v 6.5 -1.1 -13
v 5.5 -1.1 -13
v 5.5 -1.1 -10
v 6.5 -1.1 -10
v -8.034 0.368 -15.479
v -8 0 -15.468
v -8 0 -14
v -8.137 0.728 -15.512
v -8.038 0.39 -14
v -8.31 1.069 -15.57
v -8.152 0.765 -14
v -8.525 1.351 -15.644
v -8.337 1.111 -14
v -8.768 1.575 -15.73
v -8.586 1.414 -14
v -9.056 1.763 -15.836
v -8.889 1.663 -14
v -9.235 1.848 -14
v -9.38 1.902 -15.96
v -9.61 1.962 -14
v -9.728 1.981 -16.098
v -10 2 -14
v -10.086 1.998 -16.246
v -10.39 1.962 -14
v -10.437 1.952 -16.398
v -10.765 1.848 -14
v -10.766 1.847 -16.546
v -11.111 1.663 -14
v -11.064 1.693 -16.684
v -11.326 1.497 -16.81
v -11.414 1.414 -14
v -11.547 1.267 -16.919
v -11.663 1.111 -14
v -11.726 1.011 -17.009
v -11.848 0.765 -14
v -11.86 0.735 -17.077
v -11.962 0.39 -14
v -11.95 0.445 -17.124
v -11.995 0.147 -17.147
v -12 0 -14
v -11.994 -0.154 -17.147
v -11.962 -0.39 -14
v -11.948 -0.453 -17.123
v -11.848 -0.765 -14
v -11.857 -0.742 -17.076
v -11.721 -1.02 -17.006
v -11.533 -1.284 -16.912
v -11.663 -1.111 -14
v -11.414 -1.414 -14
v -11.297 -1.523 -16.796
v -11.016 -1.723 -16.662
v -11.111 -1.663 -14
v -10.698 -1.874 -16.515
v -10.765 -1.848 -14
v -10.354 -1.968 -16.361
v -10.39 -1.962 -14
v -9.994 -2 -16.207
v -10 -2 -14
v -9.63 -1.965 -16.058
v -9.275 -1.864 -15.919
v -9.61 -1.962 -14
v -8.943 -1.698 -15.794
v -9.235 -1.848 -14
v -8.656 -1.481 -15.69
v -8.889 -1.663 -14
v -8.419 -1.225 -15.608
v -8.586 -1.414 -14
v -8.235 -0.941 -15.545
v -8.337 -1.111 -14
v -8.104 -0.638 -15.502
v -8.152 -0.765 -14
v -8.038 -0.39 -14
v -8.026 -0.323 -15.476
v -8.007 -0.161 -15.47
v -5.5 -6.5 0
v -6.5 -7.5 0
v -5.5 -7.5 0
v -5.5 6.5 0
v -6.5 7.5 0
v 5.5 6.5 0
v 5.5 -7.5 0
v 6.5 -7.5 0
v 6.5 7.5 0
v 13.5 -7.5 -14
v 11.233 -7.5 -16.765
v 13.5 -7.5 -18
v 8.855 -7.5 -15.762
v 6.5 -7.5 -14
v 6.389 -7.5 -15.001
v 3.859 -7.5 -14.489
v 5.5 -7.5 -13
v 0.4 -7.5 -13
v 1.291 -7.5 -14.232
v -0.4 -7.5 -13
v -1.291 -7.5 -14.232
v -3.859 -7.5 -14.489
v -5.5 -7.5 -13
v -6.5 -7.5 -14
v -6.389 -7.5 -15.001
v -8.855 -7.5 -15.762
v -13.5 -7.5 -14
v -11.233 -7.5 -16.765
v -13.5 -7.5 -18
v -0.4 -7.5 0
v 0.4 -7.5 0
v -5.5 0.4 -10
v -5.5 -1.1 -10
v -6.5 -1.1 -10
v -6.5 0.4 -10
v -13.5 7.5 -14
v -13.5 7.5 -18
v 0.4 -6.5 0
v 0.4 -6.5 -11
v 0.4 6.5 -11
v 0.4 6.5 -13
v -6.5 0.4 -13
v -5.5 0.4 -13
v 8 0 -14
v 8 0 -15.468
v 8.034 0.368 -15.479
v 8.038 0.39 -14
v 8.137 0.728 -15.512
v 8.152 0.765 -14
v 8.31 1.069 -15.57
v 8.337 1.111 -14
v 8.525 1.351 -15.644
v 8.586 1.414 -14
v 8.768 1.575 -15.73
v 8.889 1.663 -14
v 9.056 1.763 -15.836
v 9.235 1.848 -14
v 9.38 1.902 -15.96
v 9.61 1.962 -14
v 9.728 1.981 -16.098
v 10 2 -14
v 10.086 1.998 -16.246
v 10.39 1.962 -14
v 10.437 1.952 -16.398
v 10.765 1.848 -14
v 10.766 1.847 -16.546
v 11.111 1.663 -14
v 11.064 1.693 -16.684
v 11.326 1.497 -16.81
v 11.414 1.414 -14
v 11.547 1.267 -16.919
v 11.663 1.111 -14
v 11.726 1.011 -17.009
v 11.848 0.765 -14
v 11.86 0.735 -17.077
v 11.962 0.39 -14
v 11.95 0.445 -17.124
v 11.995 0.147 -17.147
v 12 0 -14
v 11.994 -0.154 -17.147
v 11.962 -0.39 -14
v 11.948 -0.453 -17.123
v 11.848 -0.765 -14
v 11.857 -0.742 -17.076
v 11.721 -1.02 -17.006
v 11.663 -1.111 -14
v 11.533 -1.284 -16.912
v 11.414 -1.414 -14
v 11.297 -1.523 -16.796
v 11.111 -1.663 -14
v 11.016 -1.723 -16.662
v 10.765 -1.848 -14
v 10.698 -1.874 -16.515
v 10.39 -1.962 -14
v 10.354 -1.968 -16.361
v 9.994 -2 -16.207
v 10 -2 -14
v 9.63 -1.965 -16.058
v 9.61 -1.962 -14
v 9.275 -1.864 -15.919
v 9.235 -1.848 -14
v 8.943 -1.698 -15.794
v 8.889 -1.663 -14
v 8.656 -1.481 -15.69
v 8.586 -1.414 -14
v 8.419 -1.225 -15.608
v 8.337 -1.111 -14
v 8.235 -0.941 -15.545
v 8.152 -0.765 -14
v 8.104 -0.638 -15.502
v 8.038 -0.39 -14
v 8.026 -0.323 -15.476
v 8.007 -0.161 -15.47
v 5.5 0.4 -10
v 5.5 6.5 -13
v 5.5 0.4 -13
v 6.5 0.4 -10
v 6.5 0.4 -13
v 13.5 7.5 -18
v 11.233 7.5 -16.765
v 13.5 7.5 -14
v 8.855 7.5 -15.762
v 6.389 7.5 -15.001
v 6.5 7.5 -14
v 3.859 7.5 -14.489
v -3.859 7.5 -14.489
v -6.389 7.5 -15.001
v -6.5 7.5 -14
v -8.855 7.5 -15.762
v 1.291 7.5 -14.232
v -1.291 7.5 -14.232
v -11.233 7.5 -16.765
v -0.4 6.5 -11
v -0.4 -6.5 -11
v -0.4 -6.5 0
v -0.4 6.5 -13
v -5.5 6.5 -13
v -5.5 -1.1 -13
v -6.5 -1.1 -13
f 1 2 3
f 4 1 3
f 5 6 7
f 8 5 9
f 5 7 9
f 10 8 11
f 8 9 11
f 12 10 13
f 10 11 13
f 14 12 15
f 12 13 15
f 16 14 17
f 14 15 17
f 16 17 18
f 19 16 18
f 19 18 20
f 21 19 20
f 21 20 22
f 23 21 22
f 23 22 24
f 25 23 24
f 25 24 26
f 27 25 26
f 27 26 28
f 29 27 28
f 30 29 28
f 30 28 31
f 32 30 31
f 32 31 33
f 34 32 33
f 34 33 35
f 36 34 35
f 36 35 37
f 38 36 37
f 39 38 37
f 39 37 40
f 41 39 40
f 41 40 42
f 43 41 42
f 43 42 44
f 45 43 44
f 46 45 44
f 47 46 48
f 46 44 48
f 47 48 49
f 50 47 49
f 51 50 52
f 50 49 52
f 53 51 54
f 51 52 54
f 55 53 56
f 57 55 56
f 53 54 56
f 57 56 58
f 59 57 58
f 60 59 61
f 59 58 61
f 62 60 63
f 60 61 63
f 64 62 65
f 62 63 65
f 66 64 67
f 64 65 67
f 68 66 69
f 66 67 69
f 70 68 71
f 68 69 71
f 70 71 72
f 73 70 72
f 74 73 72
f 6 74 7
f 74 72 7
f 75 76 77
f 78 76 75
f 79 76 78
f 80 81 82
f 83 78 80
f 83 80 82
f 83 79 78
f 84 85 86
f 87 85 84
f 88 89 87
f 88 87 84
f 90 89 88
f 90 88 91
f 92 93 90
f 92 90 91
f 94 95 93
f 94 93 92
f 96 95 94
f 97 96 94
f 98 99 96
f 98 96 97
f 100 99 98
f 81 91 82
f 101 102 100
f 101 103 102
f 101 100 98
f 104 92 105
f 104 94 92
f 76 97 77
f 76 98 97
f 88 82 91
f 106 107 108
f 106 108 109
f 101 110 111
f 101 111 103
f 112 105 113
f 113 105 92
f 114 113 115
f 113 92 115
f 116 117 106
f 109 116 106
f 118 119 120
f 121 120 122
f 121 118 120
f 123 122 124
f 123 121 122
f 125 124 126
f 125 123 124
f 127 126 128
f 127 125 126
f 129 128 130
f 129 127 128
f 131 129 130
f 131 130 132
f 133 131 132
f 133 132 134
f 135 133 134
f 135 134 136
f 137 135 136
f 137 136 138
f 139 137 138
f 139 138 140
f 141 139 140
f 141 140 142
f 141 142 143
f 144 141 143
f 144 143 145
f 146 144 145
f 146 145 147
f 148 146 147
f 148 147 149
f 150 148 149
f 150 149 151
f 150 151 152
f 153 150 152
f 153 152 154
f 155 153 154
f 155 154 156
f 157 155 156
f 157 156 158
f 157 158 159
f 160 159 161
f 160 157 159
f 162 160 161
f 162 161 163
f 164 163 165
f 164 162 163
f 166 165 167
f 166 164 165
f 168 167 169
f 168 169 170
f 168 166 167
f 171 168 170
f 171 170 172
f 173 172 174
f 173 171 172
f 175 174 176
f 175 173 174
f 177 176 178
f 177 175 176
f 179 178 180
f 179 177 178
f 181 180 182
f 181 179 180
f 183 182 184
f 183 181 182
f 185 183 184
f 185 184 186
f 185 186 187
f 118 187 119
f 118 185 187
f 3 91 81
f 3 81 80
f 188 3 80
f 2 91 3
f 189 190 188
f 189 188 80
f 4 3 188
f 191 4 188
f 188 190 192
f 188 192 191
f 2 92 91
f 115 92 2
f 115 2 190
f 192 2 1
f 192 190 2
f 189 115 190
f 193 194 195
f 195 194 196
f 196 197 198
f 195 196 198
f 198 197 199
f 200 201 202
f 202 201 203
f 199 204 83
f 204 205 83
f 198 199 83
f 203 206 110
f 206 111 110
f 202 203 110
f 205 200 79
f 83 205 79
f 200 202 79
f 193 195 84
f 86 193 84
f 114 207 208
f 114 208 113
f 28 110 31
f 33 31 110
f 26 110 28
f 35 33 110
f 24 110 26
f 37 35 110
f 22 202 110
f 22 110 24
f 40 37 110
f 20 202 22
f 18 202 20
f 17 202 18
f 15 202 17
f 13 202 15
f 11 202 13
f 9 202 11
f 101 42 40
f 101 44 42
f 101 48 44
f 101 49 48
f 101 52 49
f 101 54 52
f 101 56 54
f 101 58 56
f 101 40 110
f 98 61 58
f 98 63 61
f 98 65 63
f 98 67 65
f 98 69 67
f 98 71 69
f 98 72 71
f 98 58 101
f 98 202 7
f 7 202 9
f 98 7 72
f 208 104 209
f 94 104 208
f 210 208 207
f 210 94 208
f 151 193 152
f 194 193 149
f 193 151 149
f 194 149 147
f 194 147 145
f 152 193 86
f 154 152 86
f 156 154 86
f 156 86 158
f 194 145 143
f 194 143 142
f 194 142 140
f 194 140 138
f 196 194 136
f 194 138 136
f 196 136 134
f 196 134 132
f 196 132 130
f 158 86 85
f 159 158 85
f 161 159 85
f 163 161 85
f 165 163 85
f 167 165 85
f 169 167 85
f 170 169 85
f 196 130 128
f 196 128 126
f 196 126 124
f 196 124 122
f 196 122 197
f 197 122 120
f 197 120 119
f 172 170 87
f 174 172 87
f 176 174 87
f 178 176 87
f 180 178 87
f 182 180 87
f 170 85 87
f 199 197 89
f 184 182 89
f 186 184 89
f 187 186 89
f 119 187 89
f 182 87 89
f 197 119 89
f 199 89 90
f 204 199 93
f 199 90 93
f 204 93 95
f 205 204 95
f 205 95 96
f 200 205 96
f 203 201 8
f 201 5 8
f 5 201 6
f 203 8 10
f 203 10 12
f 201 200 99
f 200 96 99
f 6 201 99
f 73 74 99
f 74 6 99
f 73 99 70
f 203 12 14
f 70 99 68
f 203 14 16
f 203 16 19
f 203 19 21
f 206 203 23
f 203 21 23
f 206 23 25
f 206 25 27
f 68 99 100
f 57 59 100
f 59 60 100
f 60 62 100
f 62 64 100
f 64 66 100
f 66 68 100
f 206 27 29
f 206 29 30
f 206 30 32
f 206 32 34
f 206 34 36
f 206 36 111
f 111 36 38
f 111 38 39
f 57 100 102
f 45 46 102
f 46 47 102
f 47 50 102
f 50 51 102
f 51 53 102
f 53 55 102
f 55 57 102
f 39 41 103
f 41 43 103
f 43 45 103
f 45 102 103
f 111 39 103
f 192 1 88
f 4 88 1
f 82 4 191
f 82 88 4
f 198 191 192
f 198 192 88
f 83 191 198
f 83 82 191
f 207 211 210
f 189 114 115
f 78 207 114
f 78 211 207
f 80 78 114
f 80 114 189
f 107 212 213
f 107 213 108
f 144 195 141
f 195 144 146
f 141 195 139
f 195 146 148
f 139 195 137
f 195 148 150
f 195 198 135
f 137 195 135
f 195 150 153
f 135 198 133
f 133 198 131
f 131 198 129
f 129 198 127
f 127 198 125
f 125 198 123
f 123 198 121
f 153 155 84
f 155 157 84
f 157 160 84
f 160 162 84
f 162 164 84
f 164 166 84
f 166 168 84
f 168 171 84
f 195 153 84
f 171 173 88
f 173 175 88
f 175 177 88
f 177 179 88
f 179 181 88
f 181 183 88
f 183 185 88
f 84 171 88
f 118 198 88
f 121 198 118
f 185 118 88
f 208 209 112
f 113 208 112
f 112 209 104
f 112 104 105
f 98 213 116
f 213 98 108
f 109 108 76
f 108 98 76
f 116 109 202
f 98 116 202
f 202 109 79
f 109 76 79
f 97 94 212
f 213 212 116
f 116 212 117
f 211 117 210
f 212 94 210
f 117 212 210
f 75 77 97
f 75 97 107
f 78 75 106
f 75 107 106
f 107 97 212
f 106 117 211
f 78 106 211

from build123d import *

# Parameters (mm, degrees)
F1_W      = 13
F1_H      = 15
F2_DEPTH  = 18
F0_W      = 11
F0_H      = 13
F3_DEPTH  = 13
F4_W      = 0.8
F4_H      = 13
F5_DEPTH  = 2
F7_W      = 5.064733
F7_H      = 2.673392
F6_W      = 5.1
F6_H      = 2.730513
F8_DEPTH  = 15
F9_W      = 1.5
F9_H      = 3
F10_DEPTH = 25
F13_W     = 15
F13_H     = 4
F14_DEPTH = 7
F15_R     = 2
F16_DEPTH = 25
F19_DEPTH = 25


with BuildPart() as f2:
    # F1 (on Top) → F2 (new body)
    with BuildSketch(Plane.XY):
        Rectangle(F1_W, F1_H)
    extrude(amount=-F2_DEPTH)

    # F0 (on Top) → F3 (cut)
    with BuildSketch(Plane.XY):
        Rectangle(F0_W, F0_H)
    extrude(amount=-F3_DEPTH, mode=Mode.SUBTRACT)

    # F4 (on face) → F5 (join)
    with BuildSketch(Plane.XY.offset(-13)):
        Rectangle(F4_W, F4_H)
    extrude(amount=F5_DEPTH)

    # F7 (on face) + F6 (on face) → F8 (cut)
    with BuildSketch(Plane.XY.offset(-13)):
        with Locations((-2.967633, -6.836696)):
            Rectangle(F7_W, F7_H)
    with BuildSketch(Plane.XY.offset(-13)):
        with Locations((2.95, -6.865257)):
            Rectangle(F6_W, F6_H)
    extrude(amount=F8_DEPTH, mode=Mode.SUBTRACT)

    # F9 (on face) → F10 (cut)
    with BuildSketch(Plane.YZ.offset(-5.5)):
        with Locations((-0.35, -11.5)):
            Rectangle(F9_W, F9_H)
    extrude(amount=-F10_DEPTH, mode=Mode.SUBTRACT)

    # F11: F2 across plane


with BuildPart() as f2_1:
    add(f2.part)
    add(f2.part.mirror(Plane.YZ), mode=Mode.INTERSECT)

    # F13 (on face) → F14 (join)
    with BuildSketch(Plane(origin=(-6.5, 0, 0), x_dir=(0, -1, 0), z_dir=(-1, 0, 0))):
        with Locations((0, -16)):
            Rectangle(F13_W, F13_H)
    extrude(amount=F14_DEPTH)

    # F15 (on face) → F16 (cut)
    with BuildSketch(Plane.XY.offset(-14)):
        with Locations((-10, 0)):
            Circle(F15_R)
    extrude(amount=-F16_DEPTH, mode=Mode.SUBTRACT)

    # F17: F2 across plane


with BuildPart() as f2_2:
    add(f2_1.part)
    add(f2_1.part.mirror(Plane.YZ))

    # F18 (on face) → F19 (cut)
    with BuildSketch(Plane.XZ.offset(7.5)):
        with BuildLine():
            Line((-13.5, -18), (13.5, -18))
            ThreePointArc((13.5, -18), (0, -14.2), (-13.5, -18))
        make_face()
    extrude(amount=-F19_DEPTH, mode=Mode.SUBTRACT)


solid = f2_2.part
